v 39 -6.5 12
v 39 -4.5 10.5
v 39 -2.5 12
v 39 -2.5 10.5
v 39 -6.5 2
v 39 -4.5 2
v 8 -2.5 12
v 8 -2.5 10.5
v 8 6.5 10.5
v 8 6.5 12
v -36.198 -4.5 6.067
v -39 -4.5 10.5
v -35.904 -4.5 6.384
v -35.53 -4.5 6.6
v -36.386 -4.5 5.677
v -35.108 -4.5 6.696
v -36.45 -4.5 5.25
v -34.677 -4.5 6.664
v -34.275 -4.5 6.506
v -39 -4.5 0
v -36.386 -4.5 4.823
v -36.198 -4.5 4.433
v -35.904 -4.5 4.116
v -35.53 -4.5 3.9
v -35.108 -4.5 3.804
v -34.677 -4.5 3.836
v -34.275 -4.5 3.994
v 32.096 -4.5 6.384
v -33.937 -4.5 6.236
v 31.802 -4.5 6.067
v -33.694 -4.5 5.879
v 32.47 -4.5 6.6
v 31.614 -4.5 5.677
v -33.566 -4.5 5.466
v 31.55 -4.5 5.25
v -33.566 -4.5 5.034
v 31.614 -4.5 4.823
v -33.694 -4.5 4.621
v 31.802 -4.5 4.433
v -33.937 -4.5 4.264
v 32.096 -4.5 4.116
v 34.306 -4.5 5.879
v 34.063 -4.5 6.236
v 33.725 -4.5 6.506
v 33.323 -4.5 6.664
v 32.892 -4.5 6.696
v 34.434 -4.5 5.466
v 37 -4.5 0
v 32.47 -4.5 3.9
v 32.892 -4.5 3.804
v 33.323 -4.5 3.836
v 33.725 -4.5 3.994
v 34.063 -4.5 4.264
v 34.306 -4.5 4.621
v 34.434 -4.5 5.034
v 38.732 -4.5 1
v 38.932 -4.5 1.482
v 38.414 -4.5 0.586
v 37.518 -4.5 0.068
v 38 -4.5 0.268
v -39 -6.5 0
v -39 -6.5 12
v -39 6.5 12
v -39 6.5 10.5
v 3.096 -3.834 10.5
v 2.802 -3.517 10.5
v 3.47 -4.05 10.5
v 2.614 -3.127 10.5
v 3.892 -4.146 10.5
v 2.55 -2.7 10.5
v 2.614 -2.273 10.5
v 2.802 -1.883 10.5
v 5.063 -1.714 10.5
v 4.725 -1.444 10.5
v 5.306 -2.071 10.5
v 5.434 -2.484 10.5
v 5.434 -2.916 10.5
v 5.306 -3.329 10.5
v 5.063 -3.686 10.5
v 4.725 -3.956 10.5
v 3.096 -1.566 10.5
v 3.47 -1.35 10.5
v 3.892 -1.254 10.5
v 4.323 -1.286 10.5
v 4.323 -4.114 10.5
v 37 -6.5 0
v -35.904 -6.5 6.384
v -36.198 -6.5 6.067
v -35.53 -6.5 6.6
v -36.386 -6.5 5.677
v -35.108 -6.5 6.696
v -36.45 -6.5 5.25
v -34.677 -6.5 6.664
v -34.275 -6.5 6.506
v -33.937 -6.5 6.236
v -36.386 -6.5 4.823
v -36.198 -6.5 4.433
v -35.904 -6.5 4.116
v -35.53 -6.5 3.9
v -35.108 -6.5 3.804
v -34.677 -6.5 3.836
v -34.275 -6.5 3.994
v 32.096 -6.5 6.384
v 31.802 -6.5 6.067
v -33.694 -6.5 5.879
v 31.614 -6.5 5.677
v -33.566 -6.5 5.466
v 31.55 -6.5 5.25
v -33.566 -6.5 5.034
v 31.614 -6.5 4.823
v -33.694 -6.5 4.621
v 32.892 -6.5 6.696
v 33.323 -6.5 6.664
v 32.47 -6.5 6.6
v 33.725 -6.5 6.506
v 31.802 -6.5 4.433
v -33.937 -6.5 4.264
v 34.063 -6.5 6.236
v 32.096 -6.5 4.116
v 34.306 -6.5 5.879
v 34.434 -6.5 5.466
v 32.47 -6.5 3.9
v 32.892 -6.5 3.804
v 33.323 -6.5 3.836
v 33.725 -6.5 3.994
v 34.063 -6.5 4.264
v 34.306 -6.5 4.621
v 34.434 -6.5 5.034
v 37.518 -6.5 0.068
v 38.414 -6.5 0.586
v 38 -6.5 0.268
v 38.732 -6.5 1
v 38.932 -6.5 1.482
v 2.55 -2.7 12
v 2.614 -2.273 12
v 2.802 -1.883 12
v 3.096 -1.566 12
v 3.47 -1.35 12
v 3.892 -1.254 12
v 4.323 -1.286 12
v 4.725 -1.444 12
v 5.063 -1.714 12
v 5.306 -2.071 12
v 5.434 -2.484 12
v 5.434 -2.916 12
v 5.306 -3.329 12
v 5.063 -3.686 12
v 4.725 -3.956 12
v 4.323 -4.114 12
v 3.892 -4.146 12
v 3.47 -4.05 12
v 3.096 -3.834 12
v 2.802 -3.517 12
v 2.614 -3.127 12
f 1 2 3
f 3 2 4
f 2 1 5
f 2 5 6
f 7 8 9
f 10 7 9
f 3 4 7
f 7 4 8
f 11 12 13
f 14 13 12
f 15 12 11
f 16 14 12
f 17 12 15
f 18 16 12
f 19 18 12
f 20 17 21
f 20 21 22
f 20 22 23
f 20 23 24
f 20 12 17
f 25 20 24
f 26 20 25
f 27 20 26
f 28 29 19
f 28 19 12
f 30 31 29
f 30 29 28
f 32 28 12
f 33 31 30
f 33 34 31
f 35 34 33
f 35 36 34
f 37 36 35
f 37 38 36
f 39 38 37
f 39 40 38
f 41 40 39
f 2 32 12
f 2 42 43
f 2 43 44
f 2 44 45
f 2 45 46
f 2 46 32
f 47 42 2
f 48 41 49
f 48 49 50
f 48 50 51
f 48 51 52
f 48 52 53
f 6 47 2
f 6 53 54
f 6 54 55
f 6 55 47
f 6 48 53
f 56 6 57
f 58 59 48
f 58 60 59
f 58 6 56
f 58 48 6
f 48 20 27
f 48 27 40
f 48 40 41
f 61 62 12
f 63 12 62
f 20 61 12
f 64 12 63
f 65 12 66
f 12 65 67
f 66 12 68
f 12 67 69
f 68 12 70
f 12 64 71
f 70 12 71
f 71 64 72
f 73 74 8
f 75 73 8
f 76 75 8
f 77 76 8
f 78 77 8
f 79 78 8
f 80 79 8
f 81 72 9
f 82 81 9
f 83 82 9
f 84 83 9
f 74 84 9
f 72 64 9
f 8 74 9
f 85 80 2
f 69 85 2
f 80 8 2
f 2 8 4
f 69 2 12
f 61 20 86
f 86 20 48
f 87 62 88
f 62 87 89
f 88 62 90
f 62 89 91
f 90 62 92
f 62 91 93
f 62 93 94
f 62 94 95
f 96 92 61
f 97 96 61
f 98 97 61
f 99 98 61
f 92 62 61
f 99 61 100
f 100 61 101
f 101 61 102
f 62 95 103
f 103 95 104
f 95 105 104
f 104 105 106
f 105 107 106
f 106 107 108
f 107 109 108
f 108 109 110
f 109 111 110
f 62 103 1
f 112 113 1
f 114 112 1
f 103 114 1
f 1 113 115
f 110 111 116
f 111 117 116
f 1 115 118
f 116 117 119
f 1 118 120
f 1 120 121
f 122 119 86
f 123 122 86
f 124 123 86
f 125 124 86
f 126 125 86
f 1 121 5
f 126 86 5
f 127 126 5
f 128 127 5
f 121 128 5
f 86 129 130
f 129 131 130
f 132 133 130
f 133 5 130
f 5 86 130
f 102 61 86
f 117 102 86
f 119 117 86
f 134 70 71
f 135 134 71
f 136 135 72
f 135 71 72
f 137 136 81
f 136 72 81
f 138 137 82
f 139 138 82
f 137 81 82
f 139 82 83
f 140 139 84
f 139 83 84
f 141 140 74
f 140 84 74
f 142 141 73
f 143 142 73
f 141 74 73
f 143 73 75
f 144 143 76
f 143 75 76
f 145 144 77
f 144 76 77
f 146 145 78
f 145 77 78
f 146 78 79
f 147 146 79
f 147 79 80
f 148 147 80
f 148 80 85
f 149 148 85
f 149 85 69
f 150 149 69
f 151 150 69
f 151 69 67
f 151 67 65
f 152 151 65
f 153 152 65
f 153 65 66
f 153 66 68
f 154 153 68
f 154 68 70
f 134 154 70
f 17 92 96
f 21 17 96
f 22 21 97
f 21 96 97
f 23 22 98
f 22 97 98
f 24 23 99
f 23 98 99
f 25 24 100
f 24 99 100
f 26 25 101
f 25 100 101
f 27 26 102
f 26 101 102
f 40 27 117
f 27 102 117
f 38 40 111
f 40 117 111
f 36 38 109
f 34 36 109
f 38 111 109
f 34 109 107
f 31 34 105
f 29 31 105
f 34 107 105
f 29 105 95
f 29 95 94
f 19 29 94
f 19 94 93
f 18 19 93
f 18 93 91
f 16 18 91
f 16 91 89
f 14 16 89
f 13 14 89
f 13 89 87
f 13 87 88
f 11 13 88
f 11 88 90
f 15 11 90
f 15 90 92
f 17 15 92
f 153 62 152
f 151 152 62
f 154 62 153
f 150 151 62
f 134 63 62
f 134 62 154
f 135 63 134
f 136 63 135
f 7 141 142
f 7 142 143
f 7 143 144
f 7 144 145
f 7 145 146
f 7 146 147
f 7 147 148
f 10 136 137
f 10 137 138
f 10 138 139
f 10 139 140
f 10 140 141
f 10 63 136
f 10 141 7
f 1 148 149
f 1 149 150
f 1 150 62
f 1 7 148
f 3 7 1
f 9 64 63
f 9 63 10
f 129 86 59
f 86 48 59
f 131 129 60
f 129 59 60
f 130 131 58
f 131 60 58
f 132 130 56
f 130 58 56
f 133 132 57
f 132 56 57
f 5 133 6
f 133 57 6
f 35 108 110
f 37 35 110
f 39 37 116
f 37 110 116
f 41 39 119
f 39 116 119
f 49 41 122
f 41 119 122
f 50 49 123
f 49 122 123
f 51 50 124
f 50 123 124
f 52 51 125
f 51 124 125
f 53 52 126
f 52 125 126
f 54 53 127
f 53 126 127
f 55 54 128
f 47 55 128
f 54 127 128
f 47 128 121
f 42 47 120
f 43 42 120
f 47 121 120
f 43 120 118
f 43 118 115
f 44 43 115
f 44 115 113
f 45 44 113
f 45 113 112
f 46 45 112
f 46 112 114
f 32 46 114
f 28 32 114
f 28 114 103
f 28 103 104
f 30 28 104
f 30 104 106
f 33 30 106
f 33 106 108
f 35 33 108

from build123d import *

# Parameters (mm, degrees)
ESQUISSE1_W             = 78
ESQUISSE1_H             = 13
BOSS_EXTRU_1_DEPTH      = 12
ESQUISSE2_W             = 78
ESQUISSE2_H             = 10.5
ENL_V_MAT_EXTRU_1_DEPTH = 11
D_GAGEMENT_M2_51_D      = 2.9
ESQUISSE5_W             = 31
ESQUISSE5_H             = 9
ENL_V_MAT_EXTRU_2_DEPTH = 41.908434338
D_GAGEMENT_M2_52_D      = 2.9
D_GAGEMENT_M2_52_DEPTH  = 24
D_GAGEMENT_M2_52_TIP    = 0.871247898
CONG_1_R                = 2


with BuildPart() as part:
    # Esquisse1 → Boss.-Extru.1 (new body)
    with BuildSketch(Plane.XY):
        Rectangle(ESQUISSE1_W, ESQUISSE1_H)
    extrude(amount=BOSS_EXTRU_1_DEPTH)

    # Esquisse2 → Enlèv. mat.-Extru.1 (cut)
    with BuildSketch(Plane(origin=(0, 6.5, 0), x_dir=(1, 0, 0), z_dir=(0, 1, 0))):
        with Locations((0, -5.25)):
            Rectangle(ESQUISSE2_W, ESQUISSE2_H)
    extrude(amount=-ENL_V_MAT_EXTRU_1_DEPTH, mode=Mode.SUBTRACT)

    # Dégagement M2.51 (through all)
    with Locations(Plane(origin=(0, -4.5, 0), x_dir=(1, 0, 0), z_dir=(0, 1, 0))):
        with Locations((33, -5.25), (-35, -5.25)):
            Hole(D_GAGEMENT_M2_51_D / 2)

    # Esquisse5 → Enlèv. mat.-Extru.2 (cut, through all)
    with BuildSketch(Plane(origin=(0, 0, 10.5), x_dir=(-1, 0, 0), z_dir=(0, 0, -1))):
        with Locations((-23.5, 2)):
            Rectangle(ESQUISSE5_W, ESQUISSE5_H)
    extrude(amount=-ENL_V_MAT_EXTRU_2_DEPTH, mode=Mode.SUBTRACT)

    # Dégagement M2.52
    with Locations(Plane.XY.offset(12)):
        with Locations((4, -2.7)):
            Hole(D_GAGEMENT_M2_52_D / 2, depth=D_GAGEMENT_M2_52_DEPTH)
            with Locations((0, 0, -(D_GAGEMENT_M2_52_DEPTH + D_GAGEMENT_M2_52_TIP / 2))):  # 118° drill point
                Cone(0, D_GAGEMENT_M2_52_D / 2, D_GAGEMENT_M2_52_TIP, mode=Mode.SUBTRACT)

    # Congé1
    cong_1_edges = [part.edges().sort_by_distance(p)[0] for p in [
        (39, -5.5, 0),
    ]]
    fillet(cong_1_edges, radius=CONG_1_R)


solid = part.part
